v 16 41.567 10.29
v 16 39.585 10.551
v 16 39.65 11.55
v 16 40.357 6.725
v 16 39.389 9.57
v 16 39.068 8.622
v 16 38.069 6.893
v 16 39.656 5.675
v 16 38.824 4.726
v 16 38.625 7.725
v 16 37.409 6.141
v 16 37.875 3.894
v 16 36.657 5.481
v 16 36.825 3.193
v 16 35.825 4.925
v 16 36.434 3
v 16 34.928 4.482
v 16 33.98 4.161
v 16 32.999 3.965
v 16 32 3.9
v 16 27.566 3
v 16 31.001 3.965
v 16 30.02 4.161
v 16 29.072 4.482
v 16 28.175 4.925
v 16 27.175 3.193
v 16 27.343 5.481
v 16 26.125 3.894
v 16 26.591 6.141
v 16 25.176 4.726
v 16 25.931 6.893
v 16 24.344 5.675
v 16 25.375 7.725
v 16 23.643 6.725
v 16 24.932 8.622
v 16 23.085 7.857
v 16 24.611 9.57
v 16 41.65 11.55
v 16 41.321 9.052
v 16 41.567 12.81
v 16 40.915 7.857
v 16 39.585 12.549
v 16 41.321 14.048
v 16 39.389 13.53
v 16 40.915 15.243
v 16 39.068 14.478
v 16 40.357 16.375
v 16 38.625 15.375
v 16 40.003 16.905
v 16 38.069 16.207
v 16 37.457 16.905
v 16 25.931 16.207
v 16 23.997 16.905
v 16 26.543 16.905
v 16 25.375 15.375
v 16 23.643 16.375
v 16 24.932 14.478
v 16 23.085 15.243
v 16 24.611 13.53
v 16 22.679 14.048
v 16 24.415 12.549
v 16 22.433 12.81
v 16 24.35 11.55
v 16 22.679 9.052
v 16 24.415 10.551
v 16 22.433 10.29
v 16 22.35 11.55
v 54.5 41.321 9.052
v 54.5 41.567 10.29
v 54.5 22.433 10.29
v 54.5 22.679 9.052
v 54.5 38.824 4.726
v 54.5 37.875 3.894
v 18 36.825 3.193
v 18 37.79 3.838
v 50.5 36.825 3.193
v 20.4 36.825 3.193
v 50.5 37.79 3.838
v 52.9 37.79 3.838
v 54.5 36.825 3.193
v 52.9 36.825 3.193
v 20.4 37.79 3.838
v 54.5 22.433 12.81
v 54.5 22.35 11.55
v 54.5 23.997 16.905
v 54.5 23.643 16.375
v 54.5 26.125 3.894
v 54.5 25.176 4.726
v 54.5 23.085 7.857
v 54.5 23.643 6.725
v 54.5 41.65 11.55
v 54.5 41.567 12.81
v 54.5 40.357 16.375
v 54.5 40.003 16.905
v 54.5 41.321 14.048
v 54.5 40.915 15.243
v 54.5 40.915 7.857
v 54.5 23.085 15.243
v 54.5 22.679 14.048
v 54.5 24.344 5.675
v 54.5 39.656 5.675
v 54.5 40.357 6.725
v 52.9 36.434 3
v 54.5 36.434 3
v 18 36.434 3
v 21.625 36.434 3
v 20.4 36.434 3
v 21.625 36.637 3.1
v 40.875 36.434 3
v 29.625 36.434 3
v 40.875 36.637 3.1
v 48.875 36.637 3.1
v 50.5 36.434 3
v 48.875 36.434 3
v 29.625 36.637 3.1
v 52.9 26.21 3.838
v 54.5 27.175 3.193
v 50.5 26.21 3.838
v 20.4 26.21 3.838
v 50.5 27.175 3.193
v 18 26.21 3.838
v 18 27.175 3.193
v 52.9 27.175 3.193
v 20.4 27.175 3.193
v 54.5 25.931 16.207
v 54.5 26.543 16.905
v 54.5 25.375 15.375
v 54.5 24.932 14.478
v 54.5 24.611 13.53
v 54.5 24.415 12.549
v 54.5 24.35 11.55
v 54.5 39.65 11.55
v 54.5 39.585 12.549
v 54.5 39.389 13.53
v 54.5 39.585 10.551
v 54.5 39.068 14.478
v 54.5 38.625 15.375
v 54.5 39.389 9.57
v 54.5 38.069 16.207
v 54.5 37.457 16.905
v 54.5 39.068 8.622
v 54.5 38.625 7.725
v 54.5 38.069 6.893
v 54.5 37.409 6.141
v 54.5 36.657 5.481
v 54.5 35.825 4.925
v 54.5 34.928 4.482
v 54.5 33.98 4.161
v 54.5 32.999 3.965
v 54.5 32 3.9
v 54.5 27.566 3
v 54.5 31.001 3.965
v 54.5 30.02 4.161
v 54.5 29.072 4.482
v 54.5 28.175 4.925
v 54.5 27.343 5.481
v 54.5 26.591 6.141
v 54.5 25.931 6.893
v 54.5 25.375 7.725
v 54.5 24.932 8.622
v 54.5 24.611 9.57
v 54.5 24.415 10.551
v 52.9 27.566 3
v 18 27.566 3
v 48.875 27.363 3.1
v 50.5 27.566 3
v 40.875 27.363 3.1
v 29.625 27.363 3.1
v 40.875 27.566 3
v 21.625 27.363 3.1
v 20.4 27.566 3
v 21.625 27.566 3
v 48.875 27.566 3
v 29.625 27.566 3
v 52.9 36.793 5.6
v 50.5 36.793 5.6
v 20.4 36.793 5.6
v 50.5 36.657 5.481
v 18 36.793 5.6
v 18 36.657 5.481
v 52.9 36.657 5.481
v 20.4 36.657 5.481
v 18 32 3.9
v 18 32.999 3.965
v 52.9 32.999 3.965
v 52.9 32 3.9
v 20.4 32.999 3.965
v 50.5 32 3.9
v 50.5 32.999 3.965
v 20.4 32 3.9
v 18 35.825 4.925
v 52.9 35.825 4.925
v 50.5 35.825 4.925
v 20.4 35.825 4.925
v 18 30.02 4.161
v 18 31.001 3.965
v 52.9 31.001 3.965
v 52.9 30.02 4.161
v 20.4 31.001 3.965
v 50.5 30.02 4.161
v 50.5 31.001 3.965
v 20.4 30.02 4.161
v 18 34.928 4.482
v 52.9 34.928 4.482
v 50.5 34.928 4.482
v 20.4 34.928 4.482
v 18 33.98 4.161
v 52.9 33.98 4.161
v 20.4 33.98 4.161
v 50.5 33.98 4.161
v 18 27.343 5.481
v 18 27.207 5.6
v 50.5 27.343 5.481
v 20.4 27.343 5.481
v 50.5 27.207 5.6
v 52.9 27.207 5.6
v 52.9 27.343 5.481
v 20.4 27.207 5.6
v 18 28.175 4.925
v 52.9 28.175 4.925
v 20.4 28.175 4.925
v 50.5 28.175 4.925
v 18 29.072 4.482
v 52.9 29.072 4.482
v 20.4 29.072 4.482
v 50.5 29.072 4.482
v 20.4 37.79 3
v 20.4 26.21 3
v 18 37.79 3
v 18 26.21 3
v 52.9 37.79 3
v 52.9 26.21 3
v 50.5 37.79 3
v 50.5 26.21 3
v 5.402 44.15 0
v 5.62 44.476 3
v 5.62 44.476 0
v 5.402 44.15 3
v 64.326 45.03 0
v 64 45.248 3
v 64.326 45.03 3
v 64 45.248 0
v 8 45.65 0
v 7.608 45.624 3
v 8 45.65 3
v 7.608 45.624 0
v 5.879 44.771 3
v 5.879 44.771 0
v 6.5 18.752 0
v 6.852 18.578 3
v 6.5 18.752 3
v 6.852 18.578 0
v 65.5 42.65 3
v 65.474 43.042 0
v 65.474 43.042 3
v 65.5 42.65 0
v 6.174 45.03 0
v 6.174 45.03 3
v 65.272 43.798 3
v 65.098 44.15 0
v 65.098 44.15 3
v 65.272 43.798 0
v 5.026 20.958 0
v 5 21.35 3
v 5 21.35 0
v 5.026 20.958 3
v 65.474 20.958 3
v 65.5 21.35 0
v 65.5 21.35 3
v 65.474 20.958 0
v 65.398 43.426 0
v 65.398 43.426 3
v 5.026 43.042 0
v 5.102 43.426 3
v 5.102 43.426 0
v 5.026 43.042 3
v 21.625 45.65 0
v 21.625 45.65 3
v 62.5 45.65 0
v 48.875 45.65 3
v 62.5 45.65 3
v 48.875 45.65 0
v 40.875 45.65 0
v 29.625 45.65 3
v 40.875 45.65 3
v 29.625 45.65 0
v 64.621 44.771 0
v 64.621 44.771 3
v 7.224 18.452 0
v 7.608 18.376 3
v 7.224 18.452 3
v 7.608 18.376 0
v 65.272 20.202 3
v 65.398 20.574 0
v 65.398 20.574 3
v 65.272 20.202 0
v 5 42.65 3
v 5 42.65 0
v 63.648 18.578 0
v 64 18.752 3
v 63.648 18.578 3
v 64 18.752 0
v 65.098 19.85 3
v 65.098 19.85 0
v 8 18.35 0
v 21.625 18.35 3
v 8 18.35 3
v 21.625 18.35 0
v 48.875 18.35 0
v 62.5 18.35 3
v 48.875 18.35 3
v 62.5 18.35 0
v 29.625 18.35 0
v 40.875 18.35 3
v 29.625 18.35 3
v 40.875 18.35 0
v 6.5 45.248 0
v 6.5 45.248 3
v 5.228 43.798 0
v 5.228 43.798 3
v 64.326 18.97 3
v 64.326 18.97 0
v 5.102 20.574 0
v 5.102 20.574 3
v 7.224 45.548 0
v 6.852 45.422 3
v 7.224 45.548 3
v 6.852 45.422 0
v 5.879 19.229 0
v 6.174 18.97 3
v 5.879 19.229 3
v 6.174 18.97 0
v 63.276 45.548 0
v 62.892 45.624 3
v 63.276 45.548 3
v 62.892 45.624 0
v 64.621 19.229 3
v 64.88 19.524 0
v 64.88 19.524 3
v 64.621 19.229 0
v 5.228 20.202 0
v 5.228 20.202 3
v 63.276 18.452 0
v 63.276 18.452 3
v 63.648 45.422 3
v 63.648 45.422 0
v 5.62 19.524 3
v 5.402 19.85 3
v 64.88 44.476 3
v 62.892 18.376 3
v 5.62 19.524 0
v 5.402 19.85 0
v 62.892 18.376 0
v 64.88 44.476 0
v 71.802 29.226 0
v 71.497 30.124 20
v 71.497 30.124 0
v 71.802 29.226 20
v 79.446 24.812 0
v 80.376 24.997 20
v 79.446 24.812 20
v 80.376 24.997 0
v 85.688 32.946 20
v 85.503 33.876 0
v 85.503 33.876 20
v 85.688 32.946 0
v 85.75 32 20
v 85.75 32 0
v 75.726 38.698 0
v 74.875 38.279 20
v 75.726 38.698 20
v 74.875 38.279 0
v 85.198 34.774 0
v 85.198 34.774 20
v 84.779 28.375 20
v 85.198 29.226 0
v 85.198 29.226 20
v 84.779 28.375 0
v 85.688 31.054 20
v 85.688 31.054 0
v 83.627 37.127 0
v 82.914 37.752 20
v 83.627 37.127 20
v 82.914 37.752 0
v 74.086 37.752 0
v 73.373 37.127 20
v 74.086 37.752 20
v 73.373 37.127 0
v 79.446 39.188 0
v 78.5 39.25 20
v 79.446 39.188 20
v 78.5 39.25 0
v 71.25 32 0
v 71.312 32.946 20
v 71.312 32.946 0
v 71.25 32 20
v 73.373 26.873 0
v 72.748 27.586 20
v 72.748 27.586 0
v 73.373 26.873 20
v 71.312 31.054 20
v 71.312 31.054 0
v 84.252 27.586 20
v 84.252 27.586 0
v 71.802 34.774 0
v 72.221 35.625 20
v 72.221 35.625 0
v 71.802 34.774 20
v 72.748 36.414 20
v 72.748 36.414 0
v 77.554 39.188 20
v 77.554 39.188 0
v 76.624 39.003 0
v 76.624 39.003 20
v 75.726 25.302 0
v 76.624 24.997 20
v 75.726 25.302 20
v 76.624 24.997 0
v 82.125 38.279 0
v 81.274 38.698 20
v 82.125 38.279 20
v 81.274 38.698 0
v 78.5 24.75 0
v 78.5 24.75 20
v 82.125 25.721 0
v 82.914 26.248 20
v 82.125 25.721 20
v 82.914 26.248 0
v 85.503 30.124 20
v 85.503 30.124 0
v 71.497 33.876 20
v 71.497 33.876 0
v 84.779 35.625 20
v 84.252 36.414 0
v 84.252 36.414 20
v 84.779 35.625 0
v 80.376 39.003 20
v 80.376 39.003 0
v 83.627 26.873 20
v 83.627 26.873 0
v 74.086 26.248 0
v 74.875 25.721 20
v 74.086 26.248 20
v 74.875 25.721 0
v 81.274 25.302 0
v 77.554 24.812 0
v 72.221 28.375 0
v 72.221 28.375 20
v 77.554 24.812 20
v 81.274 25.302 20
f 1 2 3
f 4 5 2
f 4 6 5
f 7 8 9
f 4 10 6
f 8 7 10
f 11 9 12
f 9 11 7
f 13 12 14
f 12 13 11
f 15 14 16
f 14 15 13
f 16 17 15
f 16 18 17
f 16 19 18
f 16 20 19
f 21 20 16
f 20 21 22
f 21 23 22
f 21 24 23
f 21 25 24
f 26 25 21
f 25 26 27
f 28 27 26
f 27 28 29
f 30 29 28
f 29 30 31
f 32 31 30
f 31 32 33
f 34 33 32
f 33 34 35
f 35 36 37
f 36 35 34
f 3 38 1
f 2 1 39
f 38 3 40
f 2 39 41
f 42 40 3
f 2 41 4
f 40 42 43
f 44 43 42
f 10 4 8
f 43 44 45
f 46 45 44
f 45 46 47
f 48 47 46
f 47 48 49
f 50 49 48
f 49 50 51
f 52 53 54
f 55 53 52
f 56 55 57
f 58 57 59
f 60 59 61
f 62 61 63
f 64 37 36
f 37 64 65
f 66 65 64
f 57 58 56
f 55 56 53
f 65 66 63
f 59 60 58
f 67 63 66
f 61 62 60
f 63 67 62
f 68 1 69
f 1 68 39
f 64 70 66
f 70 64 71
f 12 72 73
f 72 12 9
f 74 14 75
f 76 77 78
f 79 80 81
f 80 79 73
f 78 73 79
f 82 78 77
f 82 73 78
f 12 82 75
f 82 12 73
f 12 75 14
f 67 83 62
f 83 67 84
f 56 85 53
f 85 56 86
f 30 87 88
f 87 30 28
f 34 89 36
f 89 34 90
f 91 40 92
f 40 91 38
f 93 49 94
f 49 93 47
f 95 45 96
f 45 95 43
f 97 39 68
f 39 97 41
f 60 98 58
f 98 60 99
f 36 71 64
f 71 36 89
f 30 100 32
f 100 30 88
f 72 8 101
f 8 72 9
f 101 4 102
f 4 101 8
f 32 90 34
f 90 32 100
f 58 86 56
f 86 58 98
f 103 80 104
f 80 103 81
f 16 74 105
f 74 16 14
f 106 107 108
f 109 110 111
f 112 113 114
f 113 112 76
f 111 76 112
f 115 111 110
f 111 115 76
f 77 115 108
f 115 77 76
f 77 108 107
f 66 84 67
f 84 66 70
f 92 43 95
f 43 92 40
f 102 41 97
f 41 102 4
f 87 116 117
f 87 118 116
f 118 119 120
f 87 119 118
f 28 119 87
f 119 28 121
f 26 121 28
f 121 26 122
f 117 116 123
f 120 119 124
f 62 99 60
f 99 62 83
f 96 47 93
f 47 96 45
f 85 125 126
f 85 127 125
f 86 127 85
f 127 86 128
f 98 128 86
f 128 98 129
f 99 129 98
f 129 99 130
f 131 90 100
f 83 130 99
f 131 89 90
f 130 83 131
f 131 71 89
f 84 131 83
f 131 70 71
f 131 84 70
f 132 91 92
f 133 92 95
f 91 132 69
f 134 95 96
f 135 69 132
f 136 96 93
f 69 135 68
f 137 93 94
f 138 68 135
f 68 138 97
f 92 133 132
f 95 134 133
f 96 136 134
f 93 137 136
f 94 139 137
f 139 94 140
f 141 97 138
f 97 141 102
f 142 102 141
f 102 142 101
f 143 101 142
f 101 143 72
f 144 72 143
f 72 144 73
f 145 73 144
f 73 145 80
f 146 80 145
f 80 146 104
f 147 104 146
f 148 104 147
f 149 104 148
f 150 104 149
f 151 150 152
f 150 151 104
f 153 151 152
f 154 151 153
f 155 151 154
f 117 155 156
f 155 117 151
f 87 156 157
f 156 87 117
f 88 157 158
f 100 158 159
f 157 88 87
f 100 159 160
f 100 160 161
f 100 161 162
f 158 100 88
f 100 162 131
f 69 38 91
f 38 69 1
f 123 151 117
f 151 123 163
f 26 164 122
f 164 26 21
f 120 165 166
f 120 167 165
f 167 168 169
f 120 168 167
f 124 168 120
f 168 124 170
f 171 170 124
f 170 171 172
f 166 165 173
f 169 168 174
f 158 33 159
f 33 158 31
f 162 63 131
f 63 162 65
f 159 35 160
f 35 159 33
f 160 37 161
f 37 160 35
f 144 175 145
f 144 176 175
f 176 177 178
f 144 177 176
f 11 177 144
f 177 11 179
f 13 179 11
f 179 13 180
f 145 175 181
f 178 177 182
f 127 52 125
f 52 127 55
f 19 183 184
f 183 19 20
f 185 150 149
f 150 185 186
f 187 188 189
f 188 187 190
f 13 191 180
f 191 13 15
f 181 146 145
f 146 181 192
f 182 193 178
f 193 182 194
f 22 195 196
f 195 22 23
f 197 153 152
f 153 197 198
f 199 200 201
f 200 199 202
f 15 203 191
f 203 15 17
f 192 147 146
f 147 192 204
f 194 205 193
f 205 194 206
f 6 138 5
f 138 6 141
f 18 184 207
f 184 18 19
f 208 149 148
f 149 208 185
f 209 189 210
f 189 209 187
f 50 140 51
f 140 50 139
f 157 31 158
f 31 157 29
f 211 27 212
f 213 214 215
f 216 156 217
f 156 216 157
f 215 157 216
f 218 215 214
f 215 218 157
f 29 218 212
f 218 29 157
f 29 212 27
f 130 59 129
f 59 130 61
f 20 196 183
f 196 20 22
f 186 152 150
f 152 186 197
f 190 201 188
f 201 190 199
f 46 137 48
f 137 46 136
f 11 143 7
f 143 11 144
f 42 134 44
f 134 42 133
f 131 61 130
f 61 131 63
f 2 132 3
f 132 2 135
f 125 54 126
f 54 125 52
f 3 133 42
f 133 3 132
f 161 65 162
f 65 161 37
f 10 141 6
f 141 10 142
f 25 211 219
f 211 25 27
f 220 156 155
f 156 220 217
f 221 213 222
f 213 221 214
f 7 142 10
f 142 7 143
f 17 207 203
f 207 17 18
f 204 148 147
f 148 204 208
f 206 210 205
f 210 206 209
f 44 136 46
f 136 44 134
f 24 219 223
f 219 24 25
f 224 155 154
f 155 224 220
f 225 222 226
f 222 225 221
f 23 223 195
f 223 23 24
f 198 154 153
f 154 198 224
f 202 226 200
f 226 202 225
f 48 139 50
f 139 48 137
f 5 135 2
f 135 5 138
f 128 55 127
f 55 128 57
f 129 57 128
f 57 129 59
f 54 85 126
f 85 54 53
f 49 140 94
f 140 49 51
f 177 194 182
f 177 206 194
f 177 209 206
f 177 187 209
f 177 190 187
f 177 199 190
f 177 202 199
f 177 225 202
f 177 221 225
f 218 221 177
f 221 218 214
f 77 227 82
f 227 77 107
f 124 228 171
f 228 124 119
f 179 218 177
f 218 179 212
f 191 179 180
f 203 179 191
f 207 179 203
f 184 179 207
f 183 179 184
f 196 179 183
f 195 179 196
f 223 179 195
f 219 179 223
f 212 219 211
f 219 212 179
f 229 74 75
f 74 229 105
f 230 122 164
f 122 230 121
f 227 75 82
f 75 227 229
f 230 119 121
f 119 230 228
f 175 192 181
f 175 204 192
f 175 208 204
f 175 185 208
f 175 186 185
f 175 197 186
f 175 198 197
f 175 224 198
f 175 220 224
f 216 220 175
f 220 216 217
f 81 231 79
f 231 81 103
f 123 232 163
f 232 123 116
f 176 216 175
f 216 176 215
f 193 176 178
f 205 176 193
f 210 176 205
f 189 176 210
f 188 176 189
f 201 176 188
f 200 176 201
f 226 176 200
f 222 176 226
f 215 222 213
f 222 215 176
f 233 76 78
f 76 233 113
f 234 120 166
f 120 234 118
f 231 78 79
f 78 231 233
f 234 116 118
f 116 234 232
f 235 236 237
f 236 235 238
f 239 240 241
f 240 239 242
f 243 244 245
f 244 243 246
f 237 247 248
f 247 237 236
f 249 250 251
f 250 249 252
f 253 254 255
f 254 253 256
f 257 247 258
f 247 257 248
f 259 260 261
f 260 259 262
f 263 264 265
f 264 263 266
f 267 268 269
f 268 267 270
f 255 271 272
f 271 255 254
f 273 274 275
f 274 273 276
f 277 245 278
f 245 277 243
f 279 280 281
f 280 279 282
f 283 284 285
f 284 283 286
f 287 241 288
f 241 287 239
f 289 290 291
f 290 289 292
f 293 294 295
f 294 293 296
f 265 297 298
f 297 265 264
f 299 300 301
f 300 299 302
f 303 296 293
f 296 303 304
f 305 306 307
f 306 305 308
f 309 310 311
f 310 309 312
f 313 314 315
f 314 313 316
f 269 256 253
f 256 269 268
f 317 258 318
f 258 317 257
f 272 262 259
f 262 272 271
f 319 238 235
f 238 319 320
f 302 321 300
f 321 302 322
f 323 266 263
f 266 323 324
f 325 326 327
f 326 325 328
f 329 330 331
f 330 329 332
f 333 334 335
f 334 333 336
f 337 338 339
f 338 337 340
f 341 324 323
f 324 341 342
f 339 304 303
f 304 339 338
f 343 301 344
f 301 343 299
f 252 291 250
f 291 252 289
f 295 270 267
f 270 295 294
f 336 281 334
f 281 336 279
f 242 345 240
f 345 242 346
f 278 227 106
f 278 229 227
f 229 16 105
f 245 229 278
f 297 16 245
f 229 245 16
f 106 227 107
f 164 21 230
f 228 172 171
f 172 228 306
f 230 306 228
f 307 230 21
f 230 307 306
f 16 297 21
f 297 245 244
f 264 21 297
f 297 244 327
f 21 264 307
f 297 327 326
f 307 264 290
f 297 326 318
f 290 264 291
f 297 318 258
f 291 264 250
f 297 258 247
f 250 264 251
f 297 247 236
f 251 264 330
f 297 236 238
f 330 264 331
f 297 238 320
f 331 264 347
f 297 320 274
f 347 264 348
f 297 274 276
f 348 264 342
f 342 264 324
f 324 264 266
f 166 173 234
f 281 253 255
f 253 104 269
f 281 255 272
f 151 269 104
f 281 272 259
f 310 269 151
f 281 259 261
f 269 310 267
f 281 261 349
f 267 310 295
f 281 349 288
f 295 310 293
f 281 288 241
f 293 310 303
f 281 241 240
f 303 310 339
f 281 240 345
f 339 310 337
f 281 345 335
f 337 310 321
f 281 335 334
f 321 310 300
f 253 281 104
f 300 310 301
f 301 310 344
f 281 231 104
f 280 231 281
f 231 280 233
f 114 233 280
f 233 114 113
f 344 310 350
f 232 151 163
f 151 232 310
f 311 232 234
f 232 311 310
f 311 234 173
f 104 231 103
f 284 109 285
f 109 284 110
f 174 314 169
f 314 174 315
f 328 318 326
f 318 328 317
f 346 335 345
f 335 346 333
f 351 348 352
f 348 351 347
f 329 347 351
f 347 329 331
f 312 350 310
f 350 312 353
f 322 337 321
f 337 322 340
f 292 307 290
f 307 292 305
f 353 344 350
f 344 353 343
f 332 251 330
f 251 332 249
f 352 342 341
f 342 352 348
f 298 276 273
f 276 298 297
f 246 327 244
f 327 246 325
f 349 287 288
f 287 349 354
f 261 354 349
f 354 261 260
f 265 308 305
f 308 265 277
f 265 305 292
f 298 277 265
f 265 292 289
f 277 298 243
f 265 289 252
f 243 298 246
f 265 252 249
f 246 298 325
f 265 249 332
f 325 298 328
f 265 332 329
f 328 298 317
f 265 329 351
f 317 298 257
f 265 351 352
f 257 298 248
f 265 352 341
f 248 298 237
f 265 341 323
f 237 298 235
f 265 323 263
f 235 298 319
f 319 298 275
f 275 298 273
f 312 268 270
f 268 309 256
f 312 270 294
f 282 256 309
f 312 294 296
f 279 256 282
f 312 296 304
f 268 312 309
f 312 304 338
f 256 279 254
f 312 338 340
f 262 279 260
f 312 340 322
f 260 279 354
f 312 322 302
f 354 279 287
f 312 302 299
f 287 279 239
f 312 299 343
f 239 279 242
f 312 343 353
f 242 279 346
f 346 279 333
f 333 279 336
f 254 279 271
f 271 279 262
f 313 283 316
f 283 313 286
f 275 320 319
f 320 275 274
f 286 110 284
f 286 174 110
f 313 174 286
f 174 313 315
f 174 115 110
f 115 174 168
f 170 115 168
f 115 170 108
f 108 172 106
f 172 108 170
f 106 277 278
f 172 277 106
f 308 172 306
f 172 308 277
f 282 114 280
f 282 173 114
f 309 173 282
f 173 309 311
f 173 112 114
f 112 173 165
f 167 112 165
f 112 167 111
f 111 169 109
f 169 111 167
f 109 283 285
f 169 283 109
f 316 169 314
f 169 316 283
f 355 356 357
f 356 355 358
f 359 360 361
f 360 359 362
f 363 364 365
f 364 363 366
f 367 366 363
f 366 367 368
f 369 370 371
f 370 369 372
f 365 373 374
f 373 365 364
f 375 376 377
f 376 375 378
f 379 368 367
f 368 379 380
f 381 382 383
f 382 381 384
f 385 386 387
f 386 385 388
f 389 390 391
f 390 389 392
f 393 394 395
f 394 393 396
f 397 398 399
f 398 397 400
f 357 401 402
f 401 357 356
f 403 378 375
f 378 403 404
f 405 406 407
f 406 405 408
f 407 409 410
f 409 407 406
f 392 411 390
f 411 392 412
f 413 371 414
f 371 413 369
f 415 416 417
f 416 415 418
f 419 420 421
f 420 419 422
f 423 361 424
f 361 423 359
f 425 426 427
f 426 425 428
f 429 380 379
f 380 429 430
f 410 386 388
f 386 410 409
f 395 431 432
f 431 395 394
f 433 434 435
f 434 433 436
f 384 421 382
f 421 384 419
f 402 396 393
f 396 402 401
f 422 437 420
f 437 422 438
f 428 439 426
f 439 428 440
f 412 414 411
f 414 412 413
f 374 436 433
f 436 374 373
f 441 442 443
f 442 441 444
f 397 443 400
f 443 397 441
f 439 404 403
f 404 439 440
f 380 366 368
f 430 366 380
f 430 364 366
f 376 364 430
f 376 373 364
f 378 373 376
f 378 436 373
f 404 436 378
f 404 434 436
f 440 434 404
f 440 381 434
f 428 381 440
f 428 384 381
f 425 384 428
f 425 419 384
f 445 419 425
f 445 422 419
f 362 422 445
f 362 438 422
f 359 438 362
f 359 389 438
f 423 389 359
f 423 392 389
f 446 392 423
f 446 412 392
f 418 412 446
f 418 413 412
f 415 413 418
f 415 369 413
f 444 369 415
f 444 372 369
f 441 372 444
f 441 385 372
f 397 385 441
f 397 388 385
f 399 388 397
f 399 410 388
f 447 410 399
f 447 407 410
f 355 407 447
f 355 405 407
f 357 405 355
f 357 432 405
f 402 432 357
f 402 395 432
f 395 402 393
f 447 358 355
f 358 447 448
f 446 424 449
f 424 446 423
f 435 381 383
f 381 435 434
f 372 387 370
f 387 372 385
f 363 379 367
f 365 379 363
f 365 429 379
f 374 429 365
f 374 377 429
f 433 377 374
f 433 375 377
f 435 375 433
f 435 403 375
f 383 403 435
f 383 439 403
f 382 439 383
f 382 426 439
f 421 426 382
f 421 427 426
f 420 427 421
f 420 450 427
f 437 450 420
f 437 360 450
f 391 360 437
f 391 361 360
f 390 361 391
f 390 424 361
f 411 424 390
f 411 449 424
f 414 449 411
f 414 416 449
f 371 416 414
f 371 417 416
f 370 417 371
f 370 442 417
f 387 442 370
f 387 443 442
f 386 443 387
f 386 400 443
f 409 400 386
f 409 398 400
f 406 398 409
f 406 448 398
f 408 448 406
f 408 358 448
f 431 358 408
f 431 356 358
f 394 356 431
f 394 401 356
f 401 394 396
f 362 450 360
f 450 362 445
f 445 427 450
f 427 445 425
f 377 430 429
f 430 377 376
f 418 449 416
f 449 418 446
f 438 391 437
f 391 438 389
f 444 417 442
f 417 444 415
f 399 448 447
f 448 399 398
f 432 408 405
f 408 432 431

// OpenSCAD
/*
Sample 151: Zylindrischer Zellhalter — 1 x AA
Generated from the FDM Mechanical Sample Library.
Units: millimetres.

Override examples:
  openscad -o custom.stl -D 'view="plate"' -D 'render_fn=64' model.scad
  openscad -o preview.png -D 'view="assembly"' model.scad
*/
use <../../../library/fdm_mechanisms.scad>

render_fn = is_undef(render_fn) ? 48 : render_fn;
view = is_undef(view) ? "plate" : view;
$fn = render_fn;

sample_cell_cradle(
    view=view,
    cell_d=14.5,
    cell_l=50.5,
    count=1,
    cell_gap=2,
    clearance=0.4,
    strap_w=8,
    contact_keepout=6
);
